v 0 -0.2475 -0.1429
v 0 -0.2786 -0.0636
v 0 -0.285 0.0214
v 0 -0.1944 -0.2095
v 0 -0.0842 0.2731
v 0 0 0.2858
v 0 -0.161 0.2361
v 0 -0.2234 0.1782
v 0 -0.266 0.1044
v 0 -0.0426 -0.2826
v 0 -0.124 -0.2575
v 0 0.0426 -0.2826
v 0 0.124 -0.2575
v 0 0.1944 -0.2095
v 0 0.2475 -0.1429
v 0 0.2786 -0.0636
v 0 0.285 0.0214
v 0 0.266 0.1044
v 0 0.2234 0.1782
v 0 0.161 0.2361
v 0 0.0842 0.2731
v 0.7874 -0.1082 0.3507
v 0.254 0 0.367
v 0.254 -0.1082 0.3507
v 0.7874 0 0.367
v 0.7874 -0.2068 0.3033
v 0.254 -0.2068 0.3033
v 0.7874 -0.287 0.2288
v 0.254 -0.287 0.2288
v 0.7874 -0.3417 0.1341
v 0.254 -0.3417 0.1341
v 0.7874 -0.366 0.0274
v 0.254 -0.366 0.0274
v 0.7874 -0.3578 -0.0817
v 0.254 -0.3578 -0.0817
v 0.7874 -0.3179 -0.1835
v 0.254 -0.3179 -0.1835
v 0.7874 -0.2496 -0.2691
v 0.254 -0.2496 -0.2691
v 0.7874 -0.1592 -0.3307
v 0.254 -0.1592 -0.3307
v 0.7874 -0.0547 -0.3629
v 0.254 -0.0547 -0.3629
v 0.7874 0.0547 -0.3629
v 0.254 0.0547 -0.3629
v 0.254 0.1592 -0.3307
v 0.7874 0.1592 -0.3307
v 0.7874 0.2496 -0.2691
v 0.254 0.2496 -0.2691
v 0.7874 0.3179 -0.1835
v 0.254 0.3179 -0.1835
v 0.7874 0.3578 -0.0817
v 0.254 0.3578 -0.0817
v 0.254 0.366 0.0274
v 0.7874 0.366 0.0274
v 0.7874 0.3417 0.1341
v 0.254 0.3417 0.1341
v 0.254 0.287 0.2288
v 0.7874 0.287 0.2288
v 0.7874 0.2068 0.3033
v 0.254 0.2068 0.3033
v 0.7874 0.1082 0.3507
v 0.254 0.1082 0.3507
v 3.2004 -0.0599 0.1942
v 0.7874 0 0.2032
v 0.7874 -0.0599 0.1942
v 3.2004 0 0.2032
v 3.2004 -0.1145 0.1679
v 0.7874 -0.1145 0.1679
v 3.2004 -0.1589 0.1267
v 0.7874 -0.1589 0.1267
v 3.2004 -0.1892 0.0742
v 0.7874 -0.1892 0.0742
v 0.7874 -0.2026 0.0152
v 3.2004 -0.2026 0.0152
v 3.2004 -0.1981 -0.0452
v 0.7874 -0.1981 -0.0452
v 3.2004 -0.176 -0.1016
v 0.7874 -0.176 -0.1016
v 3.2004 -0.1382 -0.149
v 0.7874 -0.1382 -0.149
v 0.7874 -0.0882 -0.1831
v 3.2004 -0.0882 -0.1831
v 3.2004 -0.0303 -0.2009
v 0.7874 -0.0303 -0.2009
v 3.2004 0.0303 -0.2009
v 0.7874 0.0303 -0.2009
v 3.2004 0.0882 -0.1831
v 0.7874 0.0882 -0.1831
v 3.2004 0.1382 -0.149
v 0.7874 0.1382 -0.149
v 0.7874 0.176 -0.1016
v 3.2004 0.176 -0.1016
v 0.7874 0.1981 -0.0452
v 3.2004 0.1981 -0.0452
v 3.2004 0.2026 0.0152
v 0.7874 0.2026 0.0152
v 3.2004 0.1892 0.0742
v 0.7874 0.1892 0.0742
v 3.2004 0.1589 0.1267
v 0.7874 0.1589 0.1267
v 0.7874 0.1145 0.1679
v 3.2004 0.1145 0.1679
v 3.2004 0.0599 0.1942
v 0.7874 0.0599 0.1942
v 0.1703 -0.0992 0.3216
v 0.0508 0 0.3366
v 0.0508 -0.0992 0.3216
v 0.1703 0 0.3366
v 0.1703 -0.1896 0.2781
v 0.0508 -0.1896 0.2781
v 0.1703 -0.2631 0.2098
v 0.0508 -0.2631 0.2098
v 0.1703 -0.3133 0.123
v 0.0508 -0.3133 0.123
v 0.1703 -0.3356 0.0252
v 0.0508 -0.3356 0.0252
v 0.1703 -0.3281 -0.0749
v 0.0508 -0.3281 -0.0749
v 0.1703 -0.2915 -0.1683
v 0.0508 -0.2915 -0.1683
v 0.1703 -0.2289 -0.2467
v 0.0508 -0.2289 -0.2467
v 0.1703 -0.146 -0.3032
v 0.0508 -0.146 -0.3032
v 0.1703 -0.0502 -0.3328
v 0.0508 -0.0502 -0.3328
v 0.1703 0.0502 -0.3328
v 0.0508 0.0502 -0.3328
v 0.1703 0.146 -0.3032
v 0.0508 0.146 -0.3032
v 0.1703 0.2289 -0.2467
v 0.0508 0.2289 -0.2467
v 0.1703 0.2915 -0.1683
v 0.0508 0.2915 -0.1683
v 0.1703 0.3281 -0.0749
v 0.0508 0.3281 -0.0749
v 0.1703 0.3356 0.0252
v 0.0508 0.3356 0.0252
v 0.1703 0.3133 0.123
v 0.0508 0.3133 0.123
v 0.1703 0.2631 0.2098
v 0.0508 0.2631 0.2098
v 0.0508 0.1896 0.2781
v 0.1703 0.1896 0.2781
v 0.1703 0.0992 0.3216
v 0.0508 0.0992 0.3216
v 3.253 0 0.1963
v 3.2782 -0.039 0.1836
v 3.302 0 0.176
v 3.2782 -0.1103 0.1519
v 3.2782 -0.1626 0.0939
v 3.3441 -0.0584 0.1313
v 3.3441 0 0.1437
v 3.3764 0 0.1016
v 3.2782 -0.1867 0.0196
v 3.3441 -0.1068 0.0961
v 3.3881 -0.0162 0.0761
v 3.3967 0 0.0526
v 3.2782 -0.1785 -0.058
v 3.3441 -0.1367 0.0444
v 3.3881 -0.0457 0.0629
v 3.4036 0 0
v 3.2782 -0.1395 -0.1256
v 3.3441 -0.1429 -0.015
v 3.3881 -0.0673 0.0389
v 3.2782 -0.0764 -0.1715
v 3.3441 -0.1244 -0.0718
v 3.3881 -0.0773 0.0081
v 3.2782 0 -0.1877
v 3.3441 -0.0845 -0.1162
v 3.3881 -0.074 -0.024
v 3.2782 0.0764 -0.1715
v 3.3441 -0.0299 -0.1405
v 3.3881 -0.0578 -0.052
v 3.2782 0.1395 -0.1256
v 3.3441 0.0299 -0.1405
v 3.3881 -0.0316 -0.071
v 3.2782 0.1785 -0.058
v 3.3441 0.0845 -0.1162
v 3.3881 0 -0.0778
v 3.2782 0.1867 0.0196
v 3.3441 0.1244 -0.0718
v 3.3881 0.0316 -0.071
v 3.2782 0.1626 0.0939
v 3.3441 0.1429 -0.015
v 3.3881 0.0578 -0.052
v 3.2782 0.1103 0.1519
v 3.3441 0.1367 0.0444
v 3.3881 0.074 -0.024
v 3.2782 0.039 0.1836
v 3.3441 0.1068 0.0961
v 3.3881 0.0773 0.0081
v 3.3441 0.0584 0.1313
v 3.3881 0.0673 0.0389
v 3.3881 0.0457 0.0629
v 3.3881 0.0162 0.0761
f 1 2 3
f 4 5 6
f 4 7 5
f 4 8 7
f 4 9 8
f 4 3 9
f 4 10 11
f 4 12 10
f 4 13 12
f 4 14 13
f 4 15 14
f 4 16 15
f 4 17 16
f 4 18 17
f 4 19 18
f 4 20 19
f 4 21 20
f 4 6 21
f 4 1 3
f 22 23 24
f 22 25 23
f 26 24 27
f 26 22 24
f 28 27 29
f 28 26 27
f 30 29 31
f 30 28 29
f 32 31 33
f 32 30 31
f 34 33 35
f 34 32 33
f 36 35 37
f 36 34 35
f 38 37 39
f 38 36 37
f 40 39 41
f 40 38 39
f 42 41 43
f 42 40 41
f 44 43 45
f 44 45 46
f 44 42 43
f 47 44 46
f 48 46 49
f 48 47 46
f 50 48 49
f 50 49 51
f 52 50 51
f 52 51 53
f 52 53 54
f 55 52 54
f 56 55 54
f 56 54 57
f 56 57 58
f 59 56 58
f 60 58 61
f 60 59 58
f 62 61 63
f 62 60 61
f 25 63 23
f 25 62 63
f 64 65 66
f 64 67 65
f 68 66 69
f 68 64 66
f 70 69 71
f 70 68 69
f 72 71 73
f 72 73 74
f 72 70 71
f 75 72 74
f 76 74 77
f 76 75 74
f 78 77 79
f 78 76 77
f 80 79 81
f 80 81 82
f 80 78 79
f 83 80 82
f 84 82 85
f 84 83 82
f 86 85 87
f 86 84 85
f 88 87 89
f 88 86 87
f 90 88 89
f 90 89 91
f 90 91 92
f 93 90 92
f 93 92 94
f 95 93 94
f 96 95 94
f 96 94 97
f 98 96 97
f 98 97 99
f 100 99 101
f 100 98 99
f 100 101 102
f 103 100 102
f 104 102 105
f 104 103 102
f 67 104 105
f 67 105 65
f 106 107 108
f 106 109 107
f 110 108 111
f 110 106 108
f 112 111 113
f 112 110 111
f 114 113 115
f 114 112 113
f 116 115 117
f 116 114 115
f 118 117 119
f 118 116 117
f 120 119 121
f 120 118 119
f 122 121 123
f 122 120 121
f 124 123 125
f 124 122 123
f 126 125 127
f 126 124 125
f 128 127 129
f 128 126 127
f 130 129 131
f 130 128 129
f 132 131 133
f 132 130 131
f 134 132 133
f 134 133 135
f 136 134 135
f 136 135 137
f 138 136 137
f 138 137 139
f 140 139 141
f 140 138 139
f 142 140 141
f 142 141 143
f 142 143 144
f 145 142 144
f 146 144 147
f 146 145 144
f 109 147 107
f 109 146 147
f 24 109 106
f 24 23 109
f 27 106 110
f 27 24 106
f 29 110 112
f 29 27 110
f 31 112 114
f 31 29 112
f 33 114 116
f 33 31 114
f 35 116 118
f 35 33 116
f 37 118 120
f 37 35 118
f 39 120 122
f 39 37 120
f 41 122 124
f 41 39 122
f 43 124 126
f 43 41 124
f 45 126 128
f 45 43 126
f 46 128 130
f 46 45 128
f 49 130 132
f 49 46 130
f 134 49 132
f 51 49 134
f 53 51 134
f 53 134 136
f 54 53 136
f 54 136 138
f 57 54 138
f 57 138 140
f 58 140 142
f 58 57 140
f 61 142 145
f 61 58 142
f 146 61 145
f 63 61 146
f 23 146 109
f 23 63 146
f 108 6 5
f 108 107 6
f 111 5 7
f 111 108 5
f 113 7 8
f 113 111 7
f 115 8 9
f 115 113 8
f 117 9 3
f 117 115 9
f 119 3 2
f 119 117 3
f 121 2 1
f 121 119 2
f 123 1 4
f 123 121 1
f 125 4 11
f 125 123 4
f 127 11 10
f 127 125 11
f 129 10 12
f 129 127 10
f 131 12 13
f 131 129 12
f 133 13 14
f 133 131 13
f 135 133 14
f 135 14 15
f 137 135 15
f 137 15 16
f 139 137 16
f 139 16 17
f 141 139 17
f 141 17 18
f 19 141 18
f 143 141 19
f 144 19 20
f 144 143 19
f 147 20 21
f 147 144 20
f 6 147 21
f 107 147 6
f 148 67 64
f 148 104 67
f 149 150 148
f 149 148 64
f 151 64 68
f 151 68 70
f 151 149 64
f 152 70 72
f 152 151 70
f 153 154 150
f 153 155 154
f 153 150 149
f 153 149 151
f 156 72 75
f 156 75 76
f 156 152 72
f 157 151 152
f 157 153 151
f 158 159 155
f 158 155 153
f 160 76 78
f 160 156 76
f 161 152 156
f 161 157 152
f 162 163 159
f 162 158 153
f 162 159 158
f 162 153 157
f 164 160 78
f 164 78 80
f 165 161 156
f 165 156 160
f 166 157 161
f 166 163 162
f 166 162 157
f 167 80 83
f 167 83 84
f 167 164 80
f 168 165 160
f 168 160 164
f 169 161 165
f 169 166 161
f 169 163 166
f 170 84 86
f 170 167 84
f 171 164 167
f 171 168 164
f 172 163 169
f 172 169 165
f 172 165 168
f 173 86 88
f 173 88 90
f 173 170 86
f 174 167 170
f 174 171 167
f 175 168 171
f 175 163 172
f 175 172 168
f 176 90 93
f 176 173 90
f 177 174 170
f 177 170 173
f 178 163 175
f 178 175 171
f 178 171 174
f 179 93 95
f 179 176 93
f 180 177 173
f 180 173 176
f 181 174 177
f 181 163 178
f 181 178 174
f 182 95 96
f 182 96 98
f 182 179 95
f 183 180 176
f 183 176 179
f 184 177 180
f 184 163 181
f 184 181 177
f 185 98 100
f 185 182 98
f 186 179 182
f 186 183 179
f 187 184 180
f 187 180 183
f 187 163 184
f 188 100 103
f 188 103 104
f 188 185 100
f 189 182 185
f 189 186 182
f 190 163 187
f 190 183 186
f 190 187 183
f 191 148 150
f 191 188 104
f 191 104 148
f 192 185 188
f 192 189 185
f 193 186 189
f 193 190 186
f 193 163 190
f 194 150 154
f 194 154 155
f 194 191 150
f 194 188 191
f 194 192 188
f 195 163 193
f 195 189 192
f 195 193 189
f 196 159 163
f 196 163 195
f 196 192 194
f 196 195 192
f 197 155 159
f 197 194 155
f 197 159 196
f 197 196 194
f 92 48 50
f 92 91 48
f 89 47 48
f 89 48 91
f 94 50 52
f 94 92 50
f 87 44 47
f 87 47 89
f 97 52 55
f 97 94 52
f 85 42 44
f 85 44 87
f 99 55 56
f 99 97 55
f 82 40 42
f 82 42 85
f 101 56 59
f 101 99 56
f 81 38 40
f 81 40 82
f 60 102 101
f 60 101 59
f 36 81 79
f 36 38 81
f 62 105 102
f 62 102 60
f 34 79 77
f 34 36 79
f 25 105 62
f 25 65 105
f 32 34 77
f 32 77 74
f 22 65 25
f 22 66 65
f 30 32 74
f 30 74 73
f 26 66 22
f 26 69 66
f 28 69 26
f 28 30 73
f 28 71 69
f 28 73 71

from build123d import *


with BuildPart() as part:
    # Sketch1 → RevolutionAngle1 (revolve)
    with BuildSketch(Plane.XY, mode=Mode.PRIVATE) as revolutionangle1_sk:
        with BuildLine():
            Line((0, 0), (0, 0.28575))
            Line((0, 0.28575), (0.0508, 0.33655))
            Line((0.0508, 0.33655), (0.170256888, 0.33655))
            Line((0.170256888, 0.33655), (0.254, 0.36703))
            Line((0.254, 0.36703), (0.7874, 0.36703))
            Line((0.7874, 0.36703), (0.7874, 0.2032))
            Line((0.7874, 0.2032), (3.2004, 0.2032))
            ThreePointArc((3.2004, 0.2032), (3.344084098, 0.143684098), (3.4036, 0))
            Line((3.4036, 0), (0, 0))
        make_face()
    revolve(revolutionangle1_sk.sketch.rotate(Axis((0, 0, 0), (1, 0, 0)), 90), axis=Axis((0, 0, 0), (1, 0, 0)))


solid = part.part
